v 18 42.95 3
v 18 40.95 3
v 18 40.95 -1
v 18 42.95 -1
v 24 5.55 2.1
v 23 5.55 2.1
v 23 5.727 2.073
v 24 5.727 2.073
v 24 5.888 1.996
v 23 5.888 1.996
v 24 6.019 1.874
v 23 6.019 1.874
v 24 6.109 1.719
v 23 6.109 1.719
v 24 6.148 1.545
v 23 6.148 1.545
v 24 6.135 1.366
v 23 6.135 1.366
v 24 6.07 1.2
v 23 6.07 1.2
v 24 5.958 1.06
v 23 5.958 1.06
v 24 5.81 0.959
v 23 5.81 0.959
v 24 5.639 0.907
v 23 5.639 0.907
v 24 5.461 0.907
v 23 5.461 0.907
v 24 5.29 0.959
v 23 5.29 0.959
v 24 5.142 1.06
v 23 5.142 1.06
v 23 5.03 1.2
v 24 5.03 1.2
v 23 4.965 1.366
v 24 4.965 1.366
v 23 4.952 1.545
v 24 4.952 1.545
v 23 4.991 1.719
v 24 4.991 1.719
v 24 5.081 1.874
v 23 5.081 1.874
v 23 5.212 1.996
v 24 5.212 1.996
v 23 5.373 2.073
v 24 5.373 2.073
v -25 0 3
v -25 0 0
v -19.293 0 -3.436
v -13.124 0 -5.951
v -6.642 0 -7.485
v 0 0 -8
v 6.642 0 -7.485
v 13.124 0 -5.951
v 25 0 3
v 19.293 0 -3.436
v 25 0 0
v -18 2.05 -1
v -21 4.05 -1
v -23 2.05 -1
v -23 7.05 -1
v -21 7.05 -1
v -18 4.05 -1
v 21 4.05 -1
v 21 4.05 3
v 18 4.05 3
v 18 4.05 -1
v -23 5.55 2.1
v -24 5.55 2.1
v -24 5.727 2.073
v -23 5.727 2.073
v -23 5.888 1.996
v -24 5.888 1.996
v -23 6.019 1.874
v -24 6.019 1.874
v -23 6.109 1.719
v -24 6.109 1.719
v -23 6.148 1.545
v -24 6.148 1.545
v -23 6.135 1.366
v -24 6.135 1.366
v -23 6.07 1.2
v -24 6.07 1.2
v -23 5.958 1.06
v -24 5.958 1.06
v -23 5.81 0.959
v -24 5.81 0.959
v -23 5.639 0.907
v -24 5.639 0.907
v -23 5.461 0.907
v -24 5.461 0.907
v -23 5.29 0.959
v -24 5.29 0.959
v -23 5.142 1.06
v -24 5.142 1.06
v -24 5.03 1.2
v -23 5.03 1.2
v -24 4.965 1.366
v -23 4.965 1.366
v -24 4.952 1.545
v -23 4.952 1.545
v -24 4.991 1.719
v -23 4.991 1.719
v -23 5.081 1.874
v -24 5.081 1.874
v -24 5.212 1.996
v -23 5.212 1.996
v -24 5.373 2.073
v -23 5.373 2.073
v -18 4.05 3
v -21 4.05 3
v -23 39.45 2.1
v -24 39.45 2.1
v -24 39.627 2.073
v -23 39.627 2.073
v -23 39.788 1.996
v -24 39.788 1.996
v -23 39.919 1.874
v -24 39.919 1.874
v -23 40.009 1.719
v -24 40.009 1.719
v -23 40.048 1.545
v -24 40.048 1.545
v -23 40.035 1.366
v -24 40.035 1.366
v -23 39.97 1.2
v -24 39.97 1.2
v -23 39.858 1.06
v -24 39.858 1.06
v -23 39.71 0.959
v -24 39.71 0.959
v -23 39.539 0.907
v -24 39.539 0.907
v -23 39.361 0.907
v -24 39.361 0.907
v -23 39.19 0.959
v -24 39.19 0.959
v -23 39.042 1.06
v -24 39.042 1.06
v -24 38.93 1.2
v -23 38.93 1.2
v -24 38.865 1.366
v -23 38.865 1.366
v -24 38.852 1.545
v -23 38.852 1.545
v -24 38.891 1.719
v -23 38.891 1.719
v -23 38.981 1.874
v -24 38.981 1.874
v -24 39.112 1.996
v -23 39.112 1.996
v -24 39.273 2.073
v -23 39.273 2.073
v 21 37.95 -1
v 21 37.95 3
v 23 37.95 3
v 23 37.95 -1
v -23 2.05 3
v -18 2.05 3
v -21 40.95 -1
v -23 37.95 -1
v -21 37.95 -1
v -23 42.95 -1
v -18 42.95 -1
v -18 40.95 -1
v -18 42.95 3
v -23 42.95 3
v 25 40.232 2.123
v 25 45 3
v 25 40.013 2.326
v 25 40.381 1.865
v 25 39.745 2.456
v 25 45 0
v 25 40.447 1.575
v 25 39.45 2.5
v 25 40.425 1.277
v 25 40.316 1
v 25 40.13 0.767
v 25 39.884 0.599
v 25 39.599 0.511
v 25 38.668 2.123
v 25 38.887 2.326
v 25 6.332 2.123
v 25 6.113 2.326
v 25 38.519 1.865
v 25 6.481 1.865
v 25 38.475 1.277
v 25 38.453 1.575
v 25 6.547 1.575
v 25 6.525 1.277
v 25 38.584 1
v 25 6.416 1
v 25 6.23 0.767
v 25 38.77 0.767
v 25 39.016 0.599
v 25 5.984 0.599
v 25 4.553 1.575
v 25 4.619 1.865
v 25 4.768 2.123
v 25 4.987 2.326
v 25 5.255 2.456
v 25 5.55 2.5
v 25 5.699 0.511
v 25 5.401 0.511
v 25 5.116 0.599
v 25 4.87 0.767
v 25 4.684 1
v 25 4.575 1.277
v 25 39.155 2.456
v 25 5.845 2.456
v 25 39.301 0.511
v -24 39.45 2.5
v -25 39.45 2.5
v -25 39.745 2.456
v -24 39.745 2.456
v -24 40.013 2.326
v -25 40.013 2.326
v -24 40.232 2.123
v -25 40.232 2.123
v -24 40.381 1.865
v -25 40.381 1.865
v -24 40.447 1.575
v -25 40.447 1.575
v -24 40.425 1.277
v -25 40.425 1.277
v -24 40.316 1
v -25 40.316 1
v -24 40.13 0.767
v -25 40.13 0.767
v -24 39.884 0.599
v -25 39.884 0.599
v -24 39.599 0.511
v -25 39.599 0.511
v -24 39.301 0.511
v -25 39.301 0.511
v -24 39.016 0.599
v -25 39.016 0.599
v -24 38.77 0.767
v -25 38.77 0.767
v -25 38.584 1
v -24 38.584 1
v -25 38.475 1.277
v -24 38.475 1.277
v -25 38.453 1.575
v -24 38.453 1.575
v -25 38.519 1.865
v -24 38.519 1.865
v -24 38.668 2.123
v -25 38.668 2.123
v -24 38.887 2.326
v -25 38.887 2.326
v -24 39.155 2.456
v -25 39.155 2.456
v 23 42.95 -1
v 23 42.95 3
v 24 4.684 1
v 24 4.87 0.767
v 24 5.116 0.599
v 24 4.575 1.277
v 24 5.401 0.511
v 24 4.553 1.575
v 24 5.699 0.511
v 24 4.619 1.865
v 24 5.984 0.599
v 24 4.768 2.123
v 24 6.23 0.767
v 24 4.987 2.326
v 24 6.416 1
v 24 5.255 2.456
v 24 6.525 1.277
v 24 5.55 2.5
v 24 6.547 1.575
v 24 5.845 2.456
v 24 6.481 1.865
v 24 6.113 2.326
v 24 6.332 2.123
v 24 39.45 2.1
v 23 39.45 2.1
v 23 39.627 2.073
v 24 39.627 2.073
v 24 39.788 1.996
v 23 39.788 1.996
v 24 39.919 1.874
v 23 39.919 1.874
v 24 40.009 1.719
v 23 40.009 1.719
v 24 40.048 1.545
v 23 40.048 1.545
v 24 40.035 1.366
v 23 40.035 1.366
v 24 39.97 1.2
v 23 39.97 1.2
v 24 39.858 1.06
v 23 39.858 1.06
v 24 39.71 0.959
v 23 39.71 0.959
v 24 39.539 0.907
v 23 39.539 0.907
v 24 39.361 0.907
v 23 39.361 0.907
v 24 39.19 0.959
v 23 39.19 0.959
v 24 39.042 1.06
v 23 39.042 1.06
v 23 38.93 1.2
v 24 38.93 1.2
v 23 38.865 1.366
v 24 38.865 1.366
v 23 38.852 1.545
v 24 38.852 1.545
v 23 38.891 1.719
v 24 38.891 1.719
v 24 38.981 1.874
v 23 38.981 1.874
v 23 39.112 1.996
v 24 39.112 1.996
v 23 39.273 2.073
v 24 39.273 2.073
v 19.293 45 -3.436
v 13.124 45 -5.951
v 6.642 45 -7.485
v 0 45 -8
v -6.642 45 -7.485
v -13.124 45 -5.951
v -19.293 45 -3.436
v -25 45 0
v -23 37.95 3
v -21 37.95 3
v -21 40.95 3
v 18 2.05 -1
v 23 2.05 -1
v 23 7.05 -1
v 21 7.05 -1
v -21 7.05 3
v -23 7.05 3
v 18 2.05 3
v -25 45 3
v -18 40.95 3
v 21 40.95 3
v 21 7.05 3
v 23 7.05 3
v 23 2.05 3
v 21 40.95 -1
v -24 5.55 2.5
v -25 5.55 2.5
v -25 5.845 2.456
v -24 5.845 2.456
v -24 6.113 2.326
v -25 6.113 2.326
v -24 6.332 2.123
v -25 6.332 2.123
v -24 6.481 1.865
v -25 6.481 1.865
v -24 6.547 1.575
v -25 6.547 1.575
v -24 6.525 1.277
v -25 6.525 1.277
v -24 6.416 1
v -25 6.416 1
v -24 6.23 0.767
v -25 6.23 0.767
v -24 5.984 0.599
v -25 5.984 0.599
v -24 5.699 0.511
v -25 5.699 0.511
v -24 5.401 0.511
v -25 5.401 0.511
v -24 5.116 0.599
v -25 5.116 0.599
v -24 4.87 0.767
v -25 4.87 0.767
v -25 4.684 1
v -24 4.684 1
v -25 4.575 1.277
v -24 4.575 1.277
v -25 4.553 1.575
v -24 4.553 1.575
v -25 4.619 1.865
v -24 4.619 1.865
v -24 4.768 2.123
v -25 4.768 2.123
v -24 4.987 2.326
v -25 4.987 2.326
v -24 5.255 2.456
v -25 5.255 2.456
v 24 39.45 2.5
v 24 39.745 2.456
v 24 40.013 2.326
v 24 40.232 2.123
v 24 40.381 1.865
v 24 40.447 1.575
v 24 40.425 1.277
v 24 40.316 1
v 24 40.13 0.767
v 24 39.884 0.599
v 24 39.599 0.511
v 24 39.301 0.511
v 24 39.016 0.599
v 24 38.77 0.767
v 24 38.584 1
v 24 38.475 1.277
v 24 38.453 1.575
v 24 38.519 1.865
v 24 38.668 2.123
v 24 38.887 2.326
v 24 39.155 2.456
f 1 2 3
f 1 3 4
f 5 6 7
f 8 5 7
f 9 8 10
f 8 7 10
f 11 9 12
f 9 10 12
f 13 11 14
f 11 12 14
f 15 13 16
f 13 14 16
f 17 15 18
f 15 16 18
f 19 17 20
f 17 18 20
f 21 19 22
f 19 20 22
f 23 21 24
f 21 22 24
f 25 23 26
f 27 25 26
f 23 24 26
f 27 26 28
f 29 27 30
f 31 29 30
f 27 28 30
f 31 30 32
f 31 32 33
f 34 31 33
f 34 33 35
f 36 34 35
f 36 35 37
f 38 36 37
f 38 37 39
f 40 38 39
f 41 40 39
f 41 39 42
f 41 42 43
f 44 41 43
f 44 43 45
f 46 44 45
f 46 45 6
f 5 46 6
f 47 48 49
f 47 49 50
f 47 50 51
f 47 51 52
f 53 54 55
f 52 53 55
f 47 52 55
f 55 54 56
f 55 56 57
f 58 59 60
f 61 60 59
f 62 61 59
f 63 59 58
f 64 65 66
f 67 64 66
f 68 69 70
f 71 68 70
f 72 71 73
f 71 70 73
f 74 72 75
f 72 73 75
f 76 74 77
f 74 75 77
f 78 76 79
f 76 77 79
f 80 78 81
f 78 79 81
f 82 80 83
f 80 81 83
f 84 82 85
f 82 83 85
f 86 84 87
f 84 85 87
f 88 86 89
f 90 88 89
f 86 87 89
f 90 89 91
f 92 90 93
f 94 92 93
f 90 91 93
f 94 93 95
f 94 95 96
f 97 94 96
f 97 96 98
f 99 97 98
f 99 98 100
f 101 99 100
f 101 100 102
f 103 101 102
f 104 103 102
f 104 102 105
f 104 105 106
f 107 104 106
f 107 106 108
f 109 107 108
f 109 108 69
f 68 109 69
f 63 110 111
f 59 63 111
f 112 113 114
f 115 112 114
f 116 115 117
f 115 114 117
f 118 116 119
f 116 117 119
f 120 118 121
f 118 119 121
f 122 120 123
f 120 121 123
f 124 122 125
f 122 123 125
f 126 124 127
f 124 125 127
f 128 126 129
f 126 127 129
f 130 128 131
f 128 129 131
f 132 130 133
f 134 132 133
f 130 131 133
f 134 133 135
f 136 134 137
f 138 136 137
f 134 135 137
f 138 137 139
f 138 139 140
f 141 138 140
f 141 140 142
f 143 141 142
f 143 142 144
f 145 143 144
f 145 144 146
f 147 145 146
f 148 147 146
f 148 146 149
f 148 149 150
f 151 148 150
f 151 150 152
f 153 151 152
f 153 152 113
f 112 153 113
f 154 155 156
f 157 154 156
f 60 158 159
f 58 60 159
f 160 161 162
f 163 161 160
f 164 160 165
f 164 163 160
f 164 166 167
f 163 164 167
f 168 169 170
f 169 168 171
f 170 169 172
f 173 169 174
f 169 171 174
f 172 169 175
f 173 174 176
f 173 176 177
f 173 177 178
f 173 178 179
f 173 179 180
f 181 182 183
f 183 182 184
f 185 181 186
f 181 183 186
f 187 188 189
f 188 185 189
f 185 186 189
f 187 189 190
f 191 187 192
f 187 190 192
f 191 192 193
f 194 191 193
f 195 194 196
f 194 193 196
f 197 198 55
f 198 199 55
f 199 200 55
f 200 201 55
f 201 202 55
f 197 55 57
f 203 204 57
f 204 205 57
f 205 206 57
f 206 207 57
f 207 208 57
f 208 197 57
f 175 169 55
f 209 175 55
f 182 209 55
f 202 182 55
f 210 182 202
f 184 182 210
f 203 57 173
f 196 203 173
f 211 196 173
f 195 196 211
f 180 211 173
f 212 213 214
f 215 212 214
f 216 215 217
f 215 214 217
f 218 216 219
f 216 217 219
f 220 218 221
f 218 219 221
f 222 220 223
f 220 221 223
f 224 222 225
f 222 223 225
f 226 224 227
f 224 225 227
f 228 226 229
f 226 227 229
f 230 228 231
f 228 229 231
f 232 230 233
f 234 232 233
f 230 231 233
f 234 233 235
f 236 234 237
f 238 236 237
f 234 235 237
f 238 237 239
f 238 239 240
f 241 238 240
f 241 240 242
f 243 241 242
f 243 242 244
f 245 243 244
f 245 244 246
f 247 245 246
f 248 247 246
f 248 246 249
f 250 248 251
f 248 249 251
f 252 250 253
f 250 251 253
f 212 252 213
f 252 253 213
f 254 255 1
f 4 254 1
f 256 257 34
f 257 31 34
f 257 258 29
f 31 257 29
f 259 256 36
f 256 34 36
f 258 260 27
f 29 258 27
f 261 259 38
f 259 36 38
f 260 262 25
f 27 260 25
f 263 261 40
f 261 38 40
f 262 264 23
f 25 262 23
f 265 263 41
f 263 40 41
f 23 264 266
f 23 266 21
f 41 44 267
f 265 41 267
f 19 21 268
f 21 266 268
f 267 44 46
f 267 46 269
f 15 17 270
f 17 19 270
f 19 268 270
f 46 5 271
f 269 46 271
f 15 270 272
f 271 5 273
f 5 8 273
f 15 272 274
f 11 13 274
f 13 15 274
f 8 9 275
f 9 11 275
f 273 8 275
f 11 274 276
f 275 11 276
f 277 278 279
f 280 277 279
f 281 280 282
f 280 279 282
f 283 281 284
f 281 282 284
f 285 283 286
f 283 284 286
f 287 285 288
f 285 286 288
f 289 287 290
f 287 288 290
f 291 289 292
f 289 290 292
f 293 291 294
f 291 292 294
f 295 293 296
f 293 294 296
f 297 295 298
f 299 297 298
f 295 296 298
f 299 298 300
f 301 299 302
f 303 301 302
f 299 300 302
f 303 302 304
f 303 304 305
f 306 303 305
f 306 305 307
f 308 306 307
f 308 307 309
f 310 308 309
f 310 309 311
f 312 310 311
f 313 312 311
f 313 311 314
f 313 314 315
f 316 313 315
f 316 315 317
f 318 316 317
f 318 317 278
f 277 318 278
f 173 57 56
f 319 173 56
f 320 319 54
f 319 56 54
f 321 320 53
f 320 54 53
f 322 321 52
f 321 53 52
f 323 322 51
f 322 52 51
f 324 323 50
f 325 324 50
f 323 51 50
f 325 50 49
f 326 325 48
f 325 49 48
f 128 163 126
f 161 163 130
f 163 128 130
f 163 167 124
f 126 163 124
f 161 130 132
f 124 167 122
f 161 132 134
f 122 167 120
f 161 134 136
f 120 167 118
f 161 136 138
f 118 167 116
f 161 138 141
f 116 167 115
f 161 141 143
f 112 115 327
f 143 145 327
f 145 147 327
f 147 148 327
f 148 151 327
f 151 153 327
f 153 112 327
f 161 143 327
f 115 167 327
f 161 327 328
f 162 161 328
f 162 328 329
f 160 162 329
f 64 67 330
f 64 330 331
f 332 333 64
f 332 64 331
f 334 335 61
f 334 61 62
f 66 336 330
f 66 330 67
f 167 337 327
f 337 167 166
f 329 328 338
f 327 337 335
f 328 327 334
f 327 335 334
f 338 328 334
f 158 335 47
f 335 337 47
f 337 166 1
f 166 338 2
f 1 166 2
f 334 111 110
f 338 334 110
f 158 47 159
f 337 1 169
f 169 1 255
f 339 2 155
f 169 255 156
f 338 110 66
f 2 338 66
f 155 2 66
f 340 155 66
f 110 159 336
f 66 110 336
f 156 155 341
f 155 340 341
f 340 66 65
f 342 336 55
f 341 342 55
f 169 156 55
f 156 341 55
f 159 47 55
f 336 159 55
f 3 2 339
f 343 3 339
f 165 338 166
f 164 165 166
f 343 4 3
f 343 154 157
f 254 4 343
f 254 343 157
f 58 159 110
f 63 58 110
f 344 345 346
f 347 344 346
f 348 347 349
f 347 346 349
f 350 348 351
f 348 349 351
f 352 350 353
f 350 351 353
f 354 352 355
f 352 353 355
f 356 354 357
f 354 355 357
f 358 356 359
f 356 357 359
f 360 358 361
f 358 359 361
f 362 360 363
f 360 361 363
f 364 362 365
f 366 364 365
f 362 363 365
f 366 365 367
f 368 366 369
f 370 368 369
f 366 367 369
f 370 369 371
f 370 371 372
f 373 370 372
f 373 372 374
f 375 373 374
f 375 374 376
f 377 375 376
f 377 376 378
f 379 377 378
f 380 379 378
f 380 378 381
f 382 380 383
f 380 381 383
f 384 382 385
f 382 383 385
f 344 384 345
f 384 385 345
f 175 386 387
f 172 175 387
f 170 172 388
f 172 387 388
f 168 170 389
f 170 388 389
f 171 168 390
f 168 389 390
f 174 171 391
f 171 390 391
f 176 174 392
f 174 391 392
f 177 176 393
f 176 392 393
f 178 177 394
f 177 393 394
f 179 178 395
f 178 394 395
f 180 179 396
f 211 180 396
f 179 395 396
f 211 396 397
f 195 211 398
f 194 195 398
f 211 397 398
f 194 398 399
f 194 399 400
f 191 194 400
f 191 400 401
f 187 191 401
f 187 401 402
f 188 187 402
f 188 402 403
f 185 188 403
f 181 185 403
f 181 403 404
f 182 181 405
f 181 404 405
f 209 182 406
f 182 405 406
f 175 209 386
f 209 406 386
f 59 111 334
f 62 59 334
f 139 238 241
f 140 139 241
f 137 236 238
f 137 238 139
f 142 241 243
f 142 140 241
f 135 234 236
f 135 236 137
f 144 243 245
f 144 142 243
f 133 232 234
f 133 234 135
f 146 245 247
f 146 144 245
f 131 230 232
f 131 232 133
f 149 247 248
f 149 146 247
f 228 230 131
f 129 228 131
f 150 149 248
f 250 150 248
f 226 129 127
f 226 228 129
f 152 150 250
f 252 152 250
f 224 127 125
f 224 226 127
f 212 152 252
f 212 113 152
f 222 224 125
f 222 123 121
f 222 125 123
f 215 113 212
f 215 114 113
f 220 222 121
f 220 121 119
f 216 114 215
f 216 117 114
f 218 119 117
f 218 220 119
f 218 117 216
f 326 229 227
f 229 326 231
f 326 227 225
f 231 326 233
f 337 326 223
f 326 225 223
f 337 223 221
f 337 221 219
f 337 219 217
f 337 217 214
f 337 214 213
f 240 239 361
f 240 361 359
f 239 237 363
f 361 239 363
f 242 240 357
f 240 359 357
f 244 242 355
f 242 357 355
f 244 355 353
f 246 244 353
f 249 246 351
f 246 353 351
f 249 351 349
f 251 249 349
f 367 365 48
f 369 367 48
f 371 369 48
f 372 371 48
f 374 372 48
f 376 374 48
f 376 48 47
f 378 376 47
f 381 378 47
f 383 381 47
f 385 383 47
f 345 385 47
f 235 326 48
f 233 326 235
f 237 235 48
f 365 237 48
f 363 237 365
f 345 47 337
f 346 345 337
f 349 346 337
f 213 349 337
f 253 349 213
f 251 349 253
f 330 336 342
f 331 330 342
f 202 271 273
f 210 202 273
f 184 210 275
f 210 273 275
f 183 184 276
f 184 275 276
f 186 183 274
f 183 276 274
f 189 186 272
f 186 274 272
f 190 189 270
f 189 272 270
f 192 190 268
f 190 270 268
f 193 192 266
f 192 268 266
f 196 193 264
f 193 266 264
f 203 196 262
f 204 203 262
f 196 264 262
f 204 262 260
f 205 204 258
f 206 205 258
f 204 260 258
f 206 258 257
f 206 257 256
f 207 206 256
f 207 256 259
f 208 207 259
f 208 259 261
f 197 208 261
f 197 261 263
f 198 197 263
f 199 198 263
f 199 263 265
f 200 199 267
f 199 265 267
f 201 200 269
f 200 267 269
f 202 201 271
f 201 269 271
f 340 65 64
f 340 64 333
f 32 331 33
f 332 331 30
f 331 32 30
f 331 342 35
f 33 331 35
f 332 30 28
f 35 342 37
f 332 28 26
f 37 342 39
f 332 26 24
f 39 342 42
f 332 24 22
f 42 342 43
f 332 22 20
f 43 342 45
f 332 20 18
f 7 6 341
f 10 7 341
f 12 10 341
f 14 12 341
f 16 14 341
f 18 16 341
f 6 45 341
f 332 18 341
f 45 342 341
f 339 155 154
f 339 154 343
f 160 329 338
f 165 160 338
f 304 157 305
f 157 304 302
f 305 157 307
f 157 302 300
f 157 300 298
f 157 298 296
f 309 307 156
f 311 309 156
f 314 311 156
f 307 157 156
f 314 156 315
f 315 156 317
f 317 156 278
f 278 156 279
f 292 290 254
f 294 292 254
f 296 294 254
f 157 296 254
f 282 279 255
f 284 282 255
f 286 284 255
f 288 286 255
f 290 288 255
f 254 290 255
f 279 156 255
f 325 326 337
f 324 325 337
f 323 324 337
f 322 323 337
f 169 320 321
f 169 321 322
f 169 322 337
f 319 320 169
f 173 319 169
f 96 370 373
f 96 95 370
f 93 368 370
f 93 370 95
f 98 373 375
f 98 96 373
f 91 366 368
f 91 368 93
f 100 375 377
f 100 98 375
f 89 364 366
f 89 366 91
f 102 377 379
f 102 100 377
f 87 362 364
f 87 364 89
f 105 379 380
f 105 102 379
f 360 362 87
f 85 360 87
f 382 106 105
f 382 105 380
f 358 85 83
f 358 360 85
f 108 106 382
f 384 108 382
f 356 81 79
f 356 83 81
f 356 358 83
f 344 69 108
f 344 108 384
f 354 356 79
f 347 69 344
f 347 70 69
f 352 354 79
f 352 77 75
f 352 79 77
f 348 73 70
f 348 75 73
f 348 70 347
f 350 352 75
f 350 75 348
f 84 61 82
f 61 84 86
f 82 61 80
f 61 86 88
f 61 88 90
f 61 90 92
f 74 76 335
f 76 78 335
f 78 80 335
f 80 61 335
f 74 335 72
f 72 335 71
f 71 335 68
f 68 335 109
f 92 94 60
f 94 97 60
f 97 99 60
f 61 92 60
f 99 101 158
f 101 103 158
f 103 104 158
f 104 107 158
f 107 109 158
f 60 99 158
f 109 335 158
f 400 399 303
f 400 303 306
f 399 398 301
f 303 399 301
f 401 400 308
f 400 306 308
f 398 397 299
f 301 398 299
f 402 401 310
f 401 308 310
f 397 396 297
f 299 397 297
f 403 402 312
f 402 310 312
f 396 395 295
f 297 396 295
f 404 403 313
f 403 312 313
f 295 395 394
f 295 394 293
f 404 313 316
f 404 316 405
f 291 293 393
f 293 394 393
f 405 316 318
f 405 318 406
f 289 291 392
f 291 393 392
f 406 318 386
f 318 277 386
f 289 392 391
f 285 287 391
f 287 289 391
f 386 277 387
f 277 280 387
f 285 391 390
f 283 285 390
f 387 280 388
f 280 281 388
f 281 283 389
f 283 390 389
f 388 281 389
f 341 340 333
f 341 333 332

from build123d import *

# Parameters (mm, degrees)
EXTRUDE_1_DEPTH     = 45
SKETCH_5_W          = 2
SKETCH_5_H          = 2
SKETCH_5_W_2        = 3
SKETCH_5_H_2        = 3
CUT_EXTRUDE_1_DEPTH = 4
SKETCH_6_R          = 0.6
CUT_EXTRUDE_2_DEPTH = 2
SKETCH_6_3_R        = 1
CUT_EXTRUDE_3_DEPTH = 1
CUT_EXTRUDE_START   = -48
SKETCH_6_4_R        = 0.6
CUT_EXTRUDE_4_DEPTH = 2
CUT_EXTRUDE_START_2 = -49
SKETCH_6_5_R        = 1
CUT_EXTRUDE_6_DEPTH = 1


with BuildPart() as part:
    # 草图4 → 凸台-拉伸1 (new body)
    with BuildSketch(Plane(origin=(0, 0, 0), x_dir=(1, 0, 0), z_dir=(0, 1, 0))):
        with BuildLine():
            Line((-25, 0), (-25, -3))
            Line((-25, -3), (25, -3))
            Line((25, -3), (25, 0))
            ThreePointArc((25, 0), (0, 8), (-25, 0))
        make_face()
    extrude(amount=EXTRUDE_1_DEPTH)

    # 草图5 → 切除-拉伸1 (cut)
    with BuildSketch(Plane.XY.offset(3)):
        with Locations((-22, 41.95)):
            Rectangle(SKETCH_5_W, SKETCH_5_H)
        with Locations((-19.5, 41.95)):
            Rectangle(SKETCH_5_W_2, SKETCH_5_H)
        with Locations((-22, 39.45)):
            Rectangle(SKETCH_5_W, SKETCH_5_H_2)
        with Locations((22, 41.95)):
            Rectangle(SKETCH_5_W, SKETCH_5_H)
        with Locations((19.5, 41.95)):
            Rectangle(SKETCH_5_W_2, SKETCH_5_H)
        with Locations((22, 39.45)):
            Rectangle(SKETCH_5_W, SKETCH_5_H_2)
        with Locations((-22, 3.05)):
            Rectangle(SKETCH_5_W, SKETCH_5_H)
        with Locations((-19.5, 3.05)):
            Rectangle(SKETCH_5_W_2, SKETCH_5_H)
        with Locations((-22, 5.55)):
            Rectangle(SKETCH_5_W, SKETCH_5_H_2)
        with Locations((22, 3.05)):
            Rectangle(SKETCH_5_W, SKETCH_5_H)
        with Locations((19.5, 3.05)):
            Rectangle(SKETCH_5_W_2, SKETCH_5_H)
        with Locations((22, 5.55)):
            Rectangle(SKETCH_5_W, SKETCH_5_H_2)
    extrude(amount=-CUT_EXTRUDE_1_DEPTH, mode=Mode.SUBTRACT)

    # 草图6 → 切除-拉伸2 (cut)
    with BuildSketch(Plane.ZY.offset(25)):
        with Locations((1.5, 5.55)):
            Circle(SKETCH_6_R)
        with Locations((1.5, 39.45)):
            Circle(SKETCH_6_R)
    extrude(amount=-CUT_EXTRUDE_2_DEPTH, mode=Mode.SUBTRACT)

    # 草图6<3> → 切除-拉伸3 (cut)
    with BuildSketch(Plane.ZY.offset(25)):
        with Locations((1.5, 5.55)):
            Circle(SKETCH_6_3_R)
        with Locations((1.5, 39.45)):
            Circle(SKETCH_6_3_R)
    extrude(amount=-CUT_EXTRUDE_3_DEPTH, mode=Mode.SUBTRACT)

    # 草图6<4> → 切除-拉伸4 (cut)
    with BuildSketch(Plane.ZY.offset(25).offset(CUT_EXTRUDE_START)):
        with Locations((1.5, 5.55)):
            Circle(SKETCH_6_4_R)
        with Locations((1.5, 39.45)):
            Circle(SKETCH_6_4_R)
    extrude(amount=-CUT_EXTRUDE_4_DEPTH, mode=Mode.SUBTRACT)

    # 草图6<5> → 切除-拉伸6 (cut)
    with BuildSketch(Plane.ZY.offset(25).offset(CUT_EXTRUDE_START_2)):
        with Locations((1.5, 5.55)):
            Circle(SKETCH_6_5_R)
        with Locations((1.5, 39.45)):
            Circle(SKETCH_6_5_R)
    extrude(amount=-CUT_EXTRUDE_6_DEPTH, mode=Mode.SUBTRACT)


solid = part.part
